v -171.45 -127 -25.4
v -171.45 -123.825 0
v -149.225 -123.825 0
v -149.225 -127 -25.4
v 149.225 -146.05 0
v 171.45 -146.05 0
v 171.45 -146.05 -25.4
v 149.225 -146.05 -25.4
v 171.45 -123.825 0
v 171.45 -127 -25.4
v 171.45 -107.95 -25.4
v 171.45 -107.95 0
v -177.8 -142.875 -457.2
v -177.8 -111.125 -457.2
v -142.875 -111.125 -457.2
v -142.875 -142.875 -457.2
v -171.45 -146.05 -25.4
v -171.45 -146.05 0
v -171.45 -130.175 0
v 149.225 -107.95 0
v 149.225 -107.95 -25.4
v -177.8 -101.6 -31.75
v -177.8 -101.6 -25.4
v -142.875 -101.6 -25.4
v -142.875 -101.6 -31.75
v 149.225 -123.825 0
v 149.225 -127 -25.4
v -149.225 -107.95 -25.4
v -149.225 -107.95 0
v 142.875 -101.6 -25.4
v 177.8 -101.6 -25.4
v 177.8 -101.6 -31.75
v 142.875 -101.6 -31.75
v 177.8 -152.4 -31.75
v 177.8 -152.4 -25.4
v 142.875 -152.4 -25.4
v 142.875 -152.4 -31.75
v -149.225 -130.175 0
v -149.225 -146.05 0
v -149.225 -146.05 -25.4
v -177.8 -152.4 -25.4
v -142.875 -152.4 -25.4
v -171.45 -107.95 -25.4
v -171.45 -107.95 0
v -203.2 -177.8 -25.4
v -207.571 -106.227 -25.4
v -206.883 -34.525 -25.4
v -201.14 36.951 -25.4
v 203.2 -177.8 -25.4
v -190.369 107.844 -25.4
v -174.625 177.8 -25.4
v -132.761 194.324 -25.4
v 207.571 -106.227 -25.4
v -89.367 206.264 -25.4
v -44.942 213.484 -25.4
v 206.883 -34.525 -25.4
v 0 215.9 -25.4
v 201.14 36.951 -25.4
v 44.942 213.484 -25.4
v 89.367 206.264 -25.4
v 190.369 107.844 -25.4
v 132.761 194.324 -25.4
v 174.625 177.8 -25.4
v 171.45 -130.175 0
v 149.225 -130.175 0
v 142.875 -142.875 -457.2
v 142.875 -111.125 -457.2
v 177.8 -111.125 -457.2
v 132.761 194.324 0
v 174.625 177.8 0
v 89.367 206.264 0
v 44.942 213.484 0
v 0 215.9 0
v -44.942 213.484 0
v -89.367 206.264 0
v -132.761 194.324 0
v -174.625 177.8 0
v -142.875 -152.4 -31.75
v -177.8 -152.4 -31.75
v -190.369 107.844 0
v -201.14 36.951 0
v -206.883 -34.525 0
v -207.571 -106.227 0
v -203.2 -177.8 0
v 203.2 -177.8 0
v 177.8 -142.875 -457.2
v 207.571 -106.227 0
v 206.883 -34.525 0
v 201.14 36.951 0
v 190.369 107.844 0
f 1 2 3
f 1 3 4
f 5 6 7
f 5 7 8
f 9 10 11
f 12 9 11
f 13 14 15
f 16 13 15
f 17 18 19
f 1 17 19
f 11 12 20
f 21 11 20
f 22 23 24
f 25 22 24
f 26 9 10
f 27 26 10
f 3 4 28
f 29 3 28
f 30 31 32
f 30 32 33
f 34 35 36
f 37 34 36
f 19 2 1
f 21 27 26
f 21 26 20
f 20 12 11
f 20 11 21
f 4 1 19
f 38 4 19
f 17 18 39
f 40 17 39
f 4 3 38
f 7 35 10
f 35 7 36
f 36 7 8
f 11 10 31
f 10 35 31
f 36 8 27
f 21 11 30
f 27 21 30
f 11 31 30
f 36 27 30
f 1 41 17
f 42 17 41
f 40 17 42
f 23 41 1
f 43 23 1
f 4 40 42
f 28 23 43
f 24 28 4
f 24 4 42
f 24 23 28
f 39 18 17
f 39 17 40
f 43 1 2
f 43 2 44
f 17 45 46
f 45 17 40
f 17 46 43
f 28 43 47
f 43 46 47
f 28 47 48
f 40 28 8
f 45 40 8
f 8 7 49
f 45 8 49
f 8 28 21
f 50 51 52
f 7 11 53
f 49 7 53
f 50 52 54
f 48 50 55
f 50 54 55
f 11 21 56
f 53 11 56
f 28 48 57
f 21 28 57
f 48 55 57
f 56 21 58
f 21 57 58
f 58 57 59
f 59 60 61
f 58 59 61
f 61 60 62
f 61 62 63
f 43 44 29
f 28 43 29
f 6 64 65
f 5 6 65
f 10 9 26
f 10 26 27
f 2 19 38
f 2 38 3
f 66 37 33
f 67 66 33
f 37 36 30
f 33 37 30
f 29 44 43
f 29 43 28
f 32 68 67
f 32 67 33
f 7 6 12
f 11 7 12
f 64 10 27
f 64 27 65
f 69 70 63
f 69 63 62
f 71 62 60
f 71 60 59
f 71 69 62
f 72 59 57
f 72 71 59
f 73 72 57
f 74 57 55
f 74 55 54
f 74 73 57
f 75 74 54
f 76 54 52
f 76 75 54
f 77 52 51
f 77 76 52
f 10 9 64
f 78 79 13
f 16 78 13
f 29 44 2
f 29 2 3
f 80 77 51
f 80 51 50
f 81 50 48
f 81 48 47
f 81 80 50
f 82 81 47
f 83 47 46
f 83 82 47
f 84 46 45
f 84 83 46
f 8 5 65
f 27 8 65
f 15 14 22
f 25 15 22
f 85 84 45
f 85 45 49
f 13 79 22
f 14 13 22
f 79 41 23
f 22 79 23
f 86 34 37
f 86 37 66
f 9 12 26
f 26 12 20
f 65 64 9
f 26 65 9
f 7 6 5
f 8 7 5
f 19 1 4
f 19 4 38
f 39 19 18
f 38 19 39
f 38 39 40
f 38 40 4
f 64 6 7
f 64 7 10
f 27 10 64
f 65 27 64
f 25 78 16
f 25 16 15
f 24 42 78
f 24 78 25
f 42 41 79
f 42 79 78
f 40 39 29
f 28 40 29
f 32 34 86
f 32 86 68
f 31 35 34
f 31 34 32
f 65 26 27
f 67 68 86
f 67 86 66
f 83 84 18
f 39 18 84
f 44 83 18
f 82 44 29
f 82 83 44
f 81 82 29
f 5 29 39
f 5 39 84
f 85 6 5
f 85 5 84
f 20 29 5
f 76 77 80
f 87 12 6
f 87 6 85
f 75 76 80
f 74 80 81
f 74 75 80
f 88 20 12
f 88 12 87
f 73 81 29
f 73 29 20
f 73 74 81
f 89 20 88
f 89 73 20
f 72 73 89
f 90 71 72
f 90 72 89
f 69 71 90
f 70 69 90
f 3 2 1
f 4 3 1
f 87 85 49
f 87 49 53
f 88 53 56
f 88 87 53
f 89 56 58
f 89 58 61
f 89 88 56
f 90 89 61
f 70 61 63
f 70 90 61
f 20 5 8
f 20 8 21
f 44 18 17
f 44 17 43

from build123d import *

# Parameters (mm, degrees)
F1_DEPTH  = 25.4
F2_W      = 34.925
F2_H      = 50.8
F3_DEPTH  = 457.2
F4_W      = 34.925
F4_H      = 50.8
F4_W_2    = 22.225
F4_H_2    = 38.1
F5_DEPTH  = 25.4
F7_DEPTH  = 22.225
F8_DEPTH  = 22.225
F10_DEPTH = 34.925


with BuildPart() as f1:
    # F0 (on Top) → F1 (new body)
    with BuildSketch(Plane.XY):
        with BuildLine():
            ThreePointArc((-174.625, 177.8), (-204.6423063303, 1.2640022944), (-203.2, -177.8))
            Line((-203.2, -177.8), (203.2, -177.8))
            ThreePointArc((203.2, -177.8), (204.6423063303, 1.2640022944), (174.625, 177.8))
            ThreePointArc((174.625, 177.8), (0, 215.9), (-174.625, 177.8))
        make_face()
    extrude(amount=-F1_DEPTH)


with BuildPart() as f3:
    # F2 (on Top) → F3 (new body)
    with BuildSketch(Plane.XY):
        with Locations((-160.3375, -127)):
            Rectangle(F2_W, F2_H)
    extrude(amount=-F3_DEPTH)

    # F4 (on face) → F5 (cut)
    with BuildSketch(Plane.XY):
        with Locations((-160.3375, -127)):
            Rectangle(F4_W, F4_H)
        with Locations((-160.3375, -127)):
            Rectangle(F4_W_2, F4_H_2, mode=Mode.SUBTRACT)
    extrude(amount=-F5_DEPTH, mode=Mode.SUBTRACT)


with BuildPart() as f7_tool:
    # F6 (on face) → F7 (new body, through all)
    with BuildSketch(Plane(origin=(-171.45, 0, 0), x_dir=(0, -1, 0), z_dir=(-1, 0, 0))):
        Polygon((123.825, 0), (127, -25.4), (130.175, 0), align=None)
    extrude(amount=-F7_DEPTH)


with BuildPart() as f1_1:
    add(f1.part)

    # F7: cut by f7_tool
    add(f7_tool.part, mode=Mode.SUBTRACT)


with BuildPart() as f3_1:
    add(f3.part)

    # F7: cut by f7_tool
    add(f7_tool.part, mode=Mode.SUBTRACT)

    # F9 (on face) → F10 (cut, through all)
    with BuildSketch(Plane(origin=(-177.8, 0, 0), x_dir=(0, -1, 0), z_dir=(-1, 0, 0))):
        Polygon((152.4, -31.75), (142.875, -457.2), (152.4, -457.2), align=None)
        Polygon((101.6, -457.2), (111.125, -457.2), (101.6, -31.75), align=None)
    extrude(amount=-F10_DEPTH, mode=Mode.SUBTRACT)


with BuildPart() as f8:
    # F6 (on face) → F8 (new body, through all)
    with BuildSketch(Plane(origin=(-171.45, 0, 0), x_dir=(0, -1, 0), z_dir=(-1, 0, 0))):
        Polygon((123.825, 0), (127, -25.4), (130.175, 0), align=None)
    extrude(amount=-F8_DEPTH)


with BuildPart() as f11_1:
    # F11: instance of F8
    add(f8.part.mirror(Plane.YZ))


with BuildPart() as f11_2:
    # F11: instance of F3
    add(f3_1.part.mirror(Plane.YZ))


with BuildPart() as f1_2:
    add(f1_1.part)

    # F12: cut F3, F11_2, F8, F11_1
    add(f3_1.part, mode=Mode.SUBTRACT)
    add(f11_2.part, mode=Mode.SUBTRACT)
    add(f8.part, mode=Mode.SUBTRACT)
    add(f11_1.part, mode=Mode.SUBTRACT)


solid = Compound([f3_1.part, f8.part, f11_1.part, f11_2.part, f1_2.part])
